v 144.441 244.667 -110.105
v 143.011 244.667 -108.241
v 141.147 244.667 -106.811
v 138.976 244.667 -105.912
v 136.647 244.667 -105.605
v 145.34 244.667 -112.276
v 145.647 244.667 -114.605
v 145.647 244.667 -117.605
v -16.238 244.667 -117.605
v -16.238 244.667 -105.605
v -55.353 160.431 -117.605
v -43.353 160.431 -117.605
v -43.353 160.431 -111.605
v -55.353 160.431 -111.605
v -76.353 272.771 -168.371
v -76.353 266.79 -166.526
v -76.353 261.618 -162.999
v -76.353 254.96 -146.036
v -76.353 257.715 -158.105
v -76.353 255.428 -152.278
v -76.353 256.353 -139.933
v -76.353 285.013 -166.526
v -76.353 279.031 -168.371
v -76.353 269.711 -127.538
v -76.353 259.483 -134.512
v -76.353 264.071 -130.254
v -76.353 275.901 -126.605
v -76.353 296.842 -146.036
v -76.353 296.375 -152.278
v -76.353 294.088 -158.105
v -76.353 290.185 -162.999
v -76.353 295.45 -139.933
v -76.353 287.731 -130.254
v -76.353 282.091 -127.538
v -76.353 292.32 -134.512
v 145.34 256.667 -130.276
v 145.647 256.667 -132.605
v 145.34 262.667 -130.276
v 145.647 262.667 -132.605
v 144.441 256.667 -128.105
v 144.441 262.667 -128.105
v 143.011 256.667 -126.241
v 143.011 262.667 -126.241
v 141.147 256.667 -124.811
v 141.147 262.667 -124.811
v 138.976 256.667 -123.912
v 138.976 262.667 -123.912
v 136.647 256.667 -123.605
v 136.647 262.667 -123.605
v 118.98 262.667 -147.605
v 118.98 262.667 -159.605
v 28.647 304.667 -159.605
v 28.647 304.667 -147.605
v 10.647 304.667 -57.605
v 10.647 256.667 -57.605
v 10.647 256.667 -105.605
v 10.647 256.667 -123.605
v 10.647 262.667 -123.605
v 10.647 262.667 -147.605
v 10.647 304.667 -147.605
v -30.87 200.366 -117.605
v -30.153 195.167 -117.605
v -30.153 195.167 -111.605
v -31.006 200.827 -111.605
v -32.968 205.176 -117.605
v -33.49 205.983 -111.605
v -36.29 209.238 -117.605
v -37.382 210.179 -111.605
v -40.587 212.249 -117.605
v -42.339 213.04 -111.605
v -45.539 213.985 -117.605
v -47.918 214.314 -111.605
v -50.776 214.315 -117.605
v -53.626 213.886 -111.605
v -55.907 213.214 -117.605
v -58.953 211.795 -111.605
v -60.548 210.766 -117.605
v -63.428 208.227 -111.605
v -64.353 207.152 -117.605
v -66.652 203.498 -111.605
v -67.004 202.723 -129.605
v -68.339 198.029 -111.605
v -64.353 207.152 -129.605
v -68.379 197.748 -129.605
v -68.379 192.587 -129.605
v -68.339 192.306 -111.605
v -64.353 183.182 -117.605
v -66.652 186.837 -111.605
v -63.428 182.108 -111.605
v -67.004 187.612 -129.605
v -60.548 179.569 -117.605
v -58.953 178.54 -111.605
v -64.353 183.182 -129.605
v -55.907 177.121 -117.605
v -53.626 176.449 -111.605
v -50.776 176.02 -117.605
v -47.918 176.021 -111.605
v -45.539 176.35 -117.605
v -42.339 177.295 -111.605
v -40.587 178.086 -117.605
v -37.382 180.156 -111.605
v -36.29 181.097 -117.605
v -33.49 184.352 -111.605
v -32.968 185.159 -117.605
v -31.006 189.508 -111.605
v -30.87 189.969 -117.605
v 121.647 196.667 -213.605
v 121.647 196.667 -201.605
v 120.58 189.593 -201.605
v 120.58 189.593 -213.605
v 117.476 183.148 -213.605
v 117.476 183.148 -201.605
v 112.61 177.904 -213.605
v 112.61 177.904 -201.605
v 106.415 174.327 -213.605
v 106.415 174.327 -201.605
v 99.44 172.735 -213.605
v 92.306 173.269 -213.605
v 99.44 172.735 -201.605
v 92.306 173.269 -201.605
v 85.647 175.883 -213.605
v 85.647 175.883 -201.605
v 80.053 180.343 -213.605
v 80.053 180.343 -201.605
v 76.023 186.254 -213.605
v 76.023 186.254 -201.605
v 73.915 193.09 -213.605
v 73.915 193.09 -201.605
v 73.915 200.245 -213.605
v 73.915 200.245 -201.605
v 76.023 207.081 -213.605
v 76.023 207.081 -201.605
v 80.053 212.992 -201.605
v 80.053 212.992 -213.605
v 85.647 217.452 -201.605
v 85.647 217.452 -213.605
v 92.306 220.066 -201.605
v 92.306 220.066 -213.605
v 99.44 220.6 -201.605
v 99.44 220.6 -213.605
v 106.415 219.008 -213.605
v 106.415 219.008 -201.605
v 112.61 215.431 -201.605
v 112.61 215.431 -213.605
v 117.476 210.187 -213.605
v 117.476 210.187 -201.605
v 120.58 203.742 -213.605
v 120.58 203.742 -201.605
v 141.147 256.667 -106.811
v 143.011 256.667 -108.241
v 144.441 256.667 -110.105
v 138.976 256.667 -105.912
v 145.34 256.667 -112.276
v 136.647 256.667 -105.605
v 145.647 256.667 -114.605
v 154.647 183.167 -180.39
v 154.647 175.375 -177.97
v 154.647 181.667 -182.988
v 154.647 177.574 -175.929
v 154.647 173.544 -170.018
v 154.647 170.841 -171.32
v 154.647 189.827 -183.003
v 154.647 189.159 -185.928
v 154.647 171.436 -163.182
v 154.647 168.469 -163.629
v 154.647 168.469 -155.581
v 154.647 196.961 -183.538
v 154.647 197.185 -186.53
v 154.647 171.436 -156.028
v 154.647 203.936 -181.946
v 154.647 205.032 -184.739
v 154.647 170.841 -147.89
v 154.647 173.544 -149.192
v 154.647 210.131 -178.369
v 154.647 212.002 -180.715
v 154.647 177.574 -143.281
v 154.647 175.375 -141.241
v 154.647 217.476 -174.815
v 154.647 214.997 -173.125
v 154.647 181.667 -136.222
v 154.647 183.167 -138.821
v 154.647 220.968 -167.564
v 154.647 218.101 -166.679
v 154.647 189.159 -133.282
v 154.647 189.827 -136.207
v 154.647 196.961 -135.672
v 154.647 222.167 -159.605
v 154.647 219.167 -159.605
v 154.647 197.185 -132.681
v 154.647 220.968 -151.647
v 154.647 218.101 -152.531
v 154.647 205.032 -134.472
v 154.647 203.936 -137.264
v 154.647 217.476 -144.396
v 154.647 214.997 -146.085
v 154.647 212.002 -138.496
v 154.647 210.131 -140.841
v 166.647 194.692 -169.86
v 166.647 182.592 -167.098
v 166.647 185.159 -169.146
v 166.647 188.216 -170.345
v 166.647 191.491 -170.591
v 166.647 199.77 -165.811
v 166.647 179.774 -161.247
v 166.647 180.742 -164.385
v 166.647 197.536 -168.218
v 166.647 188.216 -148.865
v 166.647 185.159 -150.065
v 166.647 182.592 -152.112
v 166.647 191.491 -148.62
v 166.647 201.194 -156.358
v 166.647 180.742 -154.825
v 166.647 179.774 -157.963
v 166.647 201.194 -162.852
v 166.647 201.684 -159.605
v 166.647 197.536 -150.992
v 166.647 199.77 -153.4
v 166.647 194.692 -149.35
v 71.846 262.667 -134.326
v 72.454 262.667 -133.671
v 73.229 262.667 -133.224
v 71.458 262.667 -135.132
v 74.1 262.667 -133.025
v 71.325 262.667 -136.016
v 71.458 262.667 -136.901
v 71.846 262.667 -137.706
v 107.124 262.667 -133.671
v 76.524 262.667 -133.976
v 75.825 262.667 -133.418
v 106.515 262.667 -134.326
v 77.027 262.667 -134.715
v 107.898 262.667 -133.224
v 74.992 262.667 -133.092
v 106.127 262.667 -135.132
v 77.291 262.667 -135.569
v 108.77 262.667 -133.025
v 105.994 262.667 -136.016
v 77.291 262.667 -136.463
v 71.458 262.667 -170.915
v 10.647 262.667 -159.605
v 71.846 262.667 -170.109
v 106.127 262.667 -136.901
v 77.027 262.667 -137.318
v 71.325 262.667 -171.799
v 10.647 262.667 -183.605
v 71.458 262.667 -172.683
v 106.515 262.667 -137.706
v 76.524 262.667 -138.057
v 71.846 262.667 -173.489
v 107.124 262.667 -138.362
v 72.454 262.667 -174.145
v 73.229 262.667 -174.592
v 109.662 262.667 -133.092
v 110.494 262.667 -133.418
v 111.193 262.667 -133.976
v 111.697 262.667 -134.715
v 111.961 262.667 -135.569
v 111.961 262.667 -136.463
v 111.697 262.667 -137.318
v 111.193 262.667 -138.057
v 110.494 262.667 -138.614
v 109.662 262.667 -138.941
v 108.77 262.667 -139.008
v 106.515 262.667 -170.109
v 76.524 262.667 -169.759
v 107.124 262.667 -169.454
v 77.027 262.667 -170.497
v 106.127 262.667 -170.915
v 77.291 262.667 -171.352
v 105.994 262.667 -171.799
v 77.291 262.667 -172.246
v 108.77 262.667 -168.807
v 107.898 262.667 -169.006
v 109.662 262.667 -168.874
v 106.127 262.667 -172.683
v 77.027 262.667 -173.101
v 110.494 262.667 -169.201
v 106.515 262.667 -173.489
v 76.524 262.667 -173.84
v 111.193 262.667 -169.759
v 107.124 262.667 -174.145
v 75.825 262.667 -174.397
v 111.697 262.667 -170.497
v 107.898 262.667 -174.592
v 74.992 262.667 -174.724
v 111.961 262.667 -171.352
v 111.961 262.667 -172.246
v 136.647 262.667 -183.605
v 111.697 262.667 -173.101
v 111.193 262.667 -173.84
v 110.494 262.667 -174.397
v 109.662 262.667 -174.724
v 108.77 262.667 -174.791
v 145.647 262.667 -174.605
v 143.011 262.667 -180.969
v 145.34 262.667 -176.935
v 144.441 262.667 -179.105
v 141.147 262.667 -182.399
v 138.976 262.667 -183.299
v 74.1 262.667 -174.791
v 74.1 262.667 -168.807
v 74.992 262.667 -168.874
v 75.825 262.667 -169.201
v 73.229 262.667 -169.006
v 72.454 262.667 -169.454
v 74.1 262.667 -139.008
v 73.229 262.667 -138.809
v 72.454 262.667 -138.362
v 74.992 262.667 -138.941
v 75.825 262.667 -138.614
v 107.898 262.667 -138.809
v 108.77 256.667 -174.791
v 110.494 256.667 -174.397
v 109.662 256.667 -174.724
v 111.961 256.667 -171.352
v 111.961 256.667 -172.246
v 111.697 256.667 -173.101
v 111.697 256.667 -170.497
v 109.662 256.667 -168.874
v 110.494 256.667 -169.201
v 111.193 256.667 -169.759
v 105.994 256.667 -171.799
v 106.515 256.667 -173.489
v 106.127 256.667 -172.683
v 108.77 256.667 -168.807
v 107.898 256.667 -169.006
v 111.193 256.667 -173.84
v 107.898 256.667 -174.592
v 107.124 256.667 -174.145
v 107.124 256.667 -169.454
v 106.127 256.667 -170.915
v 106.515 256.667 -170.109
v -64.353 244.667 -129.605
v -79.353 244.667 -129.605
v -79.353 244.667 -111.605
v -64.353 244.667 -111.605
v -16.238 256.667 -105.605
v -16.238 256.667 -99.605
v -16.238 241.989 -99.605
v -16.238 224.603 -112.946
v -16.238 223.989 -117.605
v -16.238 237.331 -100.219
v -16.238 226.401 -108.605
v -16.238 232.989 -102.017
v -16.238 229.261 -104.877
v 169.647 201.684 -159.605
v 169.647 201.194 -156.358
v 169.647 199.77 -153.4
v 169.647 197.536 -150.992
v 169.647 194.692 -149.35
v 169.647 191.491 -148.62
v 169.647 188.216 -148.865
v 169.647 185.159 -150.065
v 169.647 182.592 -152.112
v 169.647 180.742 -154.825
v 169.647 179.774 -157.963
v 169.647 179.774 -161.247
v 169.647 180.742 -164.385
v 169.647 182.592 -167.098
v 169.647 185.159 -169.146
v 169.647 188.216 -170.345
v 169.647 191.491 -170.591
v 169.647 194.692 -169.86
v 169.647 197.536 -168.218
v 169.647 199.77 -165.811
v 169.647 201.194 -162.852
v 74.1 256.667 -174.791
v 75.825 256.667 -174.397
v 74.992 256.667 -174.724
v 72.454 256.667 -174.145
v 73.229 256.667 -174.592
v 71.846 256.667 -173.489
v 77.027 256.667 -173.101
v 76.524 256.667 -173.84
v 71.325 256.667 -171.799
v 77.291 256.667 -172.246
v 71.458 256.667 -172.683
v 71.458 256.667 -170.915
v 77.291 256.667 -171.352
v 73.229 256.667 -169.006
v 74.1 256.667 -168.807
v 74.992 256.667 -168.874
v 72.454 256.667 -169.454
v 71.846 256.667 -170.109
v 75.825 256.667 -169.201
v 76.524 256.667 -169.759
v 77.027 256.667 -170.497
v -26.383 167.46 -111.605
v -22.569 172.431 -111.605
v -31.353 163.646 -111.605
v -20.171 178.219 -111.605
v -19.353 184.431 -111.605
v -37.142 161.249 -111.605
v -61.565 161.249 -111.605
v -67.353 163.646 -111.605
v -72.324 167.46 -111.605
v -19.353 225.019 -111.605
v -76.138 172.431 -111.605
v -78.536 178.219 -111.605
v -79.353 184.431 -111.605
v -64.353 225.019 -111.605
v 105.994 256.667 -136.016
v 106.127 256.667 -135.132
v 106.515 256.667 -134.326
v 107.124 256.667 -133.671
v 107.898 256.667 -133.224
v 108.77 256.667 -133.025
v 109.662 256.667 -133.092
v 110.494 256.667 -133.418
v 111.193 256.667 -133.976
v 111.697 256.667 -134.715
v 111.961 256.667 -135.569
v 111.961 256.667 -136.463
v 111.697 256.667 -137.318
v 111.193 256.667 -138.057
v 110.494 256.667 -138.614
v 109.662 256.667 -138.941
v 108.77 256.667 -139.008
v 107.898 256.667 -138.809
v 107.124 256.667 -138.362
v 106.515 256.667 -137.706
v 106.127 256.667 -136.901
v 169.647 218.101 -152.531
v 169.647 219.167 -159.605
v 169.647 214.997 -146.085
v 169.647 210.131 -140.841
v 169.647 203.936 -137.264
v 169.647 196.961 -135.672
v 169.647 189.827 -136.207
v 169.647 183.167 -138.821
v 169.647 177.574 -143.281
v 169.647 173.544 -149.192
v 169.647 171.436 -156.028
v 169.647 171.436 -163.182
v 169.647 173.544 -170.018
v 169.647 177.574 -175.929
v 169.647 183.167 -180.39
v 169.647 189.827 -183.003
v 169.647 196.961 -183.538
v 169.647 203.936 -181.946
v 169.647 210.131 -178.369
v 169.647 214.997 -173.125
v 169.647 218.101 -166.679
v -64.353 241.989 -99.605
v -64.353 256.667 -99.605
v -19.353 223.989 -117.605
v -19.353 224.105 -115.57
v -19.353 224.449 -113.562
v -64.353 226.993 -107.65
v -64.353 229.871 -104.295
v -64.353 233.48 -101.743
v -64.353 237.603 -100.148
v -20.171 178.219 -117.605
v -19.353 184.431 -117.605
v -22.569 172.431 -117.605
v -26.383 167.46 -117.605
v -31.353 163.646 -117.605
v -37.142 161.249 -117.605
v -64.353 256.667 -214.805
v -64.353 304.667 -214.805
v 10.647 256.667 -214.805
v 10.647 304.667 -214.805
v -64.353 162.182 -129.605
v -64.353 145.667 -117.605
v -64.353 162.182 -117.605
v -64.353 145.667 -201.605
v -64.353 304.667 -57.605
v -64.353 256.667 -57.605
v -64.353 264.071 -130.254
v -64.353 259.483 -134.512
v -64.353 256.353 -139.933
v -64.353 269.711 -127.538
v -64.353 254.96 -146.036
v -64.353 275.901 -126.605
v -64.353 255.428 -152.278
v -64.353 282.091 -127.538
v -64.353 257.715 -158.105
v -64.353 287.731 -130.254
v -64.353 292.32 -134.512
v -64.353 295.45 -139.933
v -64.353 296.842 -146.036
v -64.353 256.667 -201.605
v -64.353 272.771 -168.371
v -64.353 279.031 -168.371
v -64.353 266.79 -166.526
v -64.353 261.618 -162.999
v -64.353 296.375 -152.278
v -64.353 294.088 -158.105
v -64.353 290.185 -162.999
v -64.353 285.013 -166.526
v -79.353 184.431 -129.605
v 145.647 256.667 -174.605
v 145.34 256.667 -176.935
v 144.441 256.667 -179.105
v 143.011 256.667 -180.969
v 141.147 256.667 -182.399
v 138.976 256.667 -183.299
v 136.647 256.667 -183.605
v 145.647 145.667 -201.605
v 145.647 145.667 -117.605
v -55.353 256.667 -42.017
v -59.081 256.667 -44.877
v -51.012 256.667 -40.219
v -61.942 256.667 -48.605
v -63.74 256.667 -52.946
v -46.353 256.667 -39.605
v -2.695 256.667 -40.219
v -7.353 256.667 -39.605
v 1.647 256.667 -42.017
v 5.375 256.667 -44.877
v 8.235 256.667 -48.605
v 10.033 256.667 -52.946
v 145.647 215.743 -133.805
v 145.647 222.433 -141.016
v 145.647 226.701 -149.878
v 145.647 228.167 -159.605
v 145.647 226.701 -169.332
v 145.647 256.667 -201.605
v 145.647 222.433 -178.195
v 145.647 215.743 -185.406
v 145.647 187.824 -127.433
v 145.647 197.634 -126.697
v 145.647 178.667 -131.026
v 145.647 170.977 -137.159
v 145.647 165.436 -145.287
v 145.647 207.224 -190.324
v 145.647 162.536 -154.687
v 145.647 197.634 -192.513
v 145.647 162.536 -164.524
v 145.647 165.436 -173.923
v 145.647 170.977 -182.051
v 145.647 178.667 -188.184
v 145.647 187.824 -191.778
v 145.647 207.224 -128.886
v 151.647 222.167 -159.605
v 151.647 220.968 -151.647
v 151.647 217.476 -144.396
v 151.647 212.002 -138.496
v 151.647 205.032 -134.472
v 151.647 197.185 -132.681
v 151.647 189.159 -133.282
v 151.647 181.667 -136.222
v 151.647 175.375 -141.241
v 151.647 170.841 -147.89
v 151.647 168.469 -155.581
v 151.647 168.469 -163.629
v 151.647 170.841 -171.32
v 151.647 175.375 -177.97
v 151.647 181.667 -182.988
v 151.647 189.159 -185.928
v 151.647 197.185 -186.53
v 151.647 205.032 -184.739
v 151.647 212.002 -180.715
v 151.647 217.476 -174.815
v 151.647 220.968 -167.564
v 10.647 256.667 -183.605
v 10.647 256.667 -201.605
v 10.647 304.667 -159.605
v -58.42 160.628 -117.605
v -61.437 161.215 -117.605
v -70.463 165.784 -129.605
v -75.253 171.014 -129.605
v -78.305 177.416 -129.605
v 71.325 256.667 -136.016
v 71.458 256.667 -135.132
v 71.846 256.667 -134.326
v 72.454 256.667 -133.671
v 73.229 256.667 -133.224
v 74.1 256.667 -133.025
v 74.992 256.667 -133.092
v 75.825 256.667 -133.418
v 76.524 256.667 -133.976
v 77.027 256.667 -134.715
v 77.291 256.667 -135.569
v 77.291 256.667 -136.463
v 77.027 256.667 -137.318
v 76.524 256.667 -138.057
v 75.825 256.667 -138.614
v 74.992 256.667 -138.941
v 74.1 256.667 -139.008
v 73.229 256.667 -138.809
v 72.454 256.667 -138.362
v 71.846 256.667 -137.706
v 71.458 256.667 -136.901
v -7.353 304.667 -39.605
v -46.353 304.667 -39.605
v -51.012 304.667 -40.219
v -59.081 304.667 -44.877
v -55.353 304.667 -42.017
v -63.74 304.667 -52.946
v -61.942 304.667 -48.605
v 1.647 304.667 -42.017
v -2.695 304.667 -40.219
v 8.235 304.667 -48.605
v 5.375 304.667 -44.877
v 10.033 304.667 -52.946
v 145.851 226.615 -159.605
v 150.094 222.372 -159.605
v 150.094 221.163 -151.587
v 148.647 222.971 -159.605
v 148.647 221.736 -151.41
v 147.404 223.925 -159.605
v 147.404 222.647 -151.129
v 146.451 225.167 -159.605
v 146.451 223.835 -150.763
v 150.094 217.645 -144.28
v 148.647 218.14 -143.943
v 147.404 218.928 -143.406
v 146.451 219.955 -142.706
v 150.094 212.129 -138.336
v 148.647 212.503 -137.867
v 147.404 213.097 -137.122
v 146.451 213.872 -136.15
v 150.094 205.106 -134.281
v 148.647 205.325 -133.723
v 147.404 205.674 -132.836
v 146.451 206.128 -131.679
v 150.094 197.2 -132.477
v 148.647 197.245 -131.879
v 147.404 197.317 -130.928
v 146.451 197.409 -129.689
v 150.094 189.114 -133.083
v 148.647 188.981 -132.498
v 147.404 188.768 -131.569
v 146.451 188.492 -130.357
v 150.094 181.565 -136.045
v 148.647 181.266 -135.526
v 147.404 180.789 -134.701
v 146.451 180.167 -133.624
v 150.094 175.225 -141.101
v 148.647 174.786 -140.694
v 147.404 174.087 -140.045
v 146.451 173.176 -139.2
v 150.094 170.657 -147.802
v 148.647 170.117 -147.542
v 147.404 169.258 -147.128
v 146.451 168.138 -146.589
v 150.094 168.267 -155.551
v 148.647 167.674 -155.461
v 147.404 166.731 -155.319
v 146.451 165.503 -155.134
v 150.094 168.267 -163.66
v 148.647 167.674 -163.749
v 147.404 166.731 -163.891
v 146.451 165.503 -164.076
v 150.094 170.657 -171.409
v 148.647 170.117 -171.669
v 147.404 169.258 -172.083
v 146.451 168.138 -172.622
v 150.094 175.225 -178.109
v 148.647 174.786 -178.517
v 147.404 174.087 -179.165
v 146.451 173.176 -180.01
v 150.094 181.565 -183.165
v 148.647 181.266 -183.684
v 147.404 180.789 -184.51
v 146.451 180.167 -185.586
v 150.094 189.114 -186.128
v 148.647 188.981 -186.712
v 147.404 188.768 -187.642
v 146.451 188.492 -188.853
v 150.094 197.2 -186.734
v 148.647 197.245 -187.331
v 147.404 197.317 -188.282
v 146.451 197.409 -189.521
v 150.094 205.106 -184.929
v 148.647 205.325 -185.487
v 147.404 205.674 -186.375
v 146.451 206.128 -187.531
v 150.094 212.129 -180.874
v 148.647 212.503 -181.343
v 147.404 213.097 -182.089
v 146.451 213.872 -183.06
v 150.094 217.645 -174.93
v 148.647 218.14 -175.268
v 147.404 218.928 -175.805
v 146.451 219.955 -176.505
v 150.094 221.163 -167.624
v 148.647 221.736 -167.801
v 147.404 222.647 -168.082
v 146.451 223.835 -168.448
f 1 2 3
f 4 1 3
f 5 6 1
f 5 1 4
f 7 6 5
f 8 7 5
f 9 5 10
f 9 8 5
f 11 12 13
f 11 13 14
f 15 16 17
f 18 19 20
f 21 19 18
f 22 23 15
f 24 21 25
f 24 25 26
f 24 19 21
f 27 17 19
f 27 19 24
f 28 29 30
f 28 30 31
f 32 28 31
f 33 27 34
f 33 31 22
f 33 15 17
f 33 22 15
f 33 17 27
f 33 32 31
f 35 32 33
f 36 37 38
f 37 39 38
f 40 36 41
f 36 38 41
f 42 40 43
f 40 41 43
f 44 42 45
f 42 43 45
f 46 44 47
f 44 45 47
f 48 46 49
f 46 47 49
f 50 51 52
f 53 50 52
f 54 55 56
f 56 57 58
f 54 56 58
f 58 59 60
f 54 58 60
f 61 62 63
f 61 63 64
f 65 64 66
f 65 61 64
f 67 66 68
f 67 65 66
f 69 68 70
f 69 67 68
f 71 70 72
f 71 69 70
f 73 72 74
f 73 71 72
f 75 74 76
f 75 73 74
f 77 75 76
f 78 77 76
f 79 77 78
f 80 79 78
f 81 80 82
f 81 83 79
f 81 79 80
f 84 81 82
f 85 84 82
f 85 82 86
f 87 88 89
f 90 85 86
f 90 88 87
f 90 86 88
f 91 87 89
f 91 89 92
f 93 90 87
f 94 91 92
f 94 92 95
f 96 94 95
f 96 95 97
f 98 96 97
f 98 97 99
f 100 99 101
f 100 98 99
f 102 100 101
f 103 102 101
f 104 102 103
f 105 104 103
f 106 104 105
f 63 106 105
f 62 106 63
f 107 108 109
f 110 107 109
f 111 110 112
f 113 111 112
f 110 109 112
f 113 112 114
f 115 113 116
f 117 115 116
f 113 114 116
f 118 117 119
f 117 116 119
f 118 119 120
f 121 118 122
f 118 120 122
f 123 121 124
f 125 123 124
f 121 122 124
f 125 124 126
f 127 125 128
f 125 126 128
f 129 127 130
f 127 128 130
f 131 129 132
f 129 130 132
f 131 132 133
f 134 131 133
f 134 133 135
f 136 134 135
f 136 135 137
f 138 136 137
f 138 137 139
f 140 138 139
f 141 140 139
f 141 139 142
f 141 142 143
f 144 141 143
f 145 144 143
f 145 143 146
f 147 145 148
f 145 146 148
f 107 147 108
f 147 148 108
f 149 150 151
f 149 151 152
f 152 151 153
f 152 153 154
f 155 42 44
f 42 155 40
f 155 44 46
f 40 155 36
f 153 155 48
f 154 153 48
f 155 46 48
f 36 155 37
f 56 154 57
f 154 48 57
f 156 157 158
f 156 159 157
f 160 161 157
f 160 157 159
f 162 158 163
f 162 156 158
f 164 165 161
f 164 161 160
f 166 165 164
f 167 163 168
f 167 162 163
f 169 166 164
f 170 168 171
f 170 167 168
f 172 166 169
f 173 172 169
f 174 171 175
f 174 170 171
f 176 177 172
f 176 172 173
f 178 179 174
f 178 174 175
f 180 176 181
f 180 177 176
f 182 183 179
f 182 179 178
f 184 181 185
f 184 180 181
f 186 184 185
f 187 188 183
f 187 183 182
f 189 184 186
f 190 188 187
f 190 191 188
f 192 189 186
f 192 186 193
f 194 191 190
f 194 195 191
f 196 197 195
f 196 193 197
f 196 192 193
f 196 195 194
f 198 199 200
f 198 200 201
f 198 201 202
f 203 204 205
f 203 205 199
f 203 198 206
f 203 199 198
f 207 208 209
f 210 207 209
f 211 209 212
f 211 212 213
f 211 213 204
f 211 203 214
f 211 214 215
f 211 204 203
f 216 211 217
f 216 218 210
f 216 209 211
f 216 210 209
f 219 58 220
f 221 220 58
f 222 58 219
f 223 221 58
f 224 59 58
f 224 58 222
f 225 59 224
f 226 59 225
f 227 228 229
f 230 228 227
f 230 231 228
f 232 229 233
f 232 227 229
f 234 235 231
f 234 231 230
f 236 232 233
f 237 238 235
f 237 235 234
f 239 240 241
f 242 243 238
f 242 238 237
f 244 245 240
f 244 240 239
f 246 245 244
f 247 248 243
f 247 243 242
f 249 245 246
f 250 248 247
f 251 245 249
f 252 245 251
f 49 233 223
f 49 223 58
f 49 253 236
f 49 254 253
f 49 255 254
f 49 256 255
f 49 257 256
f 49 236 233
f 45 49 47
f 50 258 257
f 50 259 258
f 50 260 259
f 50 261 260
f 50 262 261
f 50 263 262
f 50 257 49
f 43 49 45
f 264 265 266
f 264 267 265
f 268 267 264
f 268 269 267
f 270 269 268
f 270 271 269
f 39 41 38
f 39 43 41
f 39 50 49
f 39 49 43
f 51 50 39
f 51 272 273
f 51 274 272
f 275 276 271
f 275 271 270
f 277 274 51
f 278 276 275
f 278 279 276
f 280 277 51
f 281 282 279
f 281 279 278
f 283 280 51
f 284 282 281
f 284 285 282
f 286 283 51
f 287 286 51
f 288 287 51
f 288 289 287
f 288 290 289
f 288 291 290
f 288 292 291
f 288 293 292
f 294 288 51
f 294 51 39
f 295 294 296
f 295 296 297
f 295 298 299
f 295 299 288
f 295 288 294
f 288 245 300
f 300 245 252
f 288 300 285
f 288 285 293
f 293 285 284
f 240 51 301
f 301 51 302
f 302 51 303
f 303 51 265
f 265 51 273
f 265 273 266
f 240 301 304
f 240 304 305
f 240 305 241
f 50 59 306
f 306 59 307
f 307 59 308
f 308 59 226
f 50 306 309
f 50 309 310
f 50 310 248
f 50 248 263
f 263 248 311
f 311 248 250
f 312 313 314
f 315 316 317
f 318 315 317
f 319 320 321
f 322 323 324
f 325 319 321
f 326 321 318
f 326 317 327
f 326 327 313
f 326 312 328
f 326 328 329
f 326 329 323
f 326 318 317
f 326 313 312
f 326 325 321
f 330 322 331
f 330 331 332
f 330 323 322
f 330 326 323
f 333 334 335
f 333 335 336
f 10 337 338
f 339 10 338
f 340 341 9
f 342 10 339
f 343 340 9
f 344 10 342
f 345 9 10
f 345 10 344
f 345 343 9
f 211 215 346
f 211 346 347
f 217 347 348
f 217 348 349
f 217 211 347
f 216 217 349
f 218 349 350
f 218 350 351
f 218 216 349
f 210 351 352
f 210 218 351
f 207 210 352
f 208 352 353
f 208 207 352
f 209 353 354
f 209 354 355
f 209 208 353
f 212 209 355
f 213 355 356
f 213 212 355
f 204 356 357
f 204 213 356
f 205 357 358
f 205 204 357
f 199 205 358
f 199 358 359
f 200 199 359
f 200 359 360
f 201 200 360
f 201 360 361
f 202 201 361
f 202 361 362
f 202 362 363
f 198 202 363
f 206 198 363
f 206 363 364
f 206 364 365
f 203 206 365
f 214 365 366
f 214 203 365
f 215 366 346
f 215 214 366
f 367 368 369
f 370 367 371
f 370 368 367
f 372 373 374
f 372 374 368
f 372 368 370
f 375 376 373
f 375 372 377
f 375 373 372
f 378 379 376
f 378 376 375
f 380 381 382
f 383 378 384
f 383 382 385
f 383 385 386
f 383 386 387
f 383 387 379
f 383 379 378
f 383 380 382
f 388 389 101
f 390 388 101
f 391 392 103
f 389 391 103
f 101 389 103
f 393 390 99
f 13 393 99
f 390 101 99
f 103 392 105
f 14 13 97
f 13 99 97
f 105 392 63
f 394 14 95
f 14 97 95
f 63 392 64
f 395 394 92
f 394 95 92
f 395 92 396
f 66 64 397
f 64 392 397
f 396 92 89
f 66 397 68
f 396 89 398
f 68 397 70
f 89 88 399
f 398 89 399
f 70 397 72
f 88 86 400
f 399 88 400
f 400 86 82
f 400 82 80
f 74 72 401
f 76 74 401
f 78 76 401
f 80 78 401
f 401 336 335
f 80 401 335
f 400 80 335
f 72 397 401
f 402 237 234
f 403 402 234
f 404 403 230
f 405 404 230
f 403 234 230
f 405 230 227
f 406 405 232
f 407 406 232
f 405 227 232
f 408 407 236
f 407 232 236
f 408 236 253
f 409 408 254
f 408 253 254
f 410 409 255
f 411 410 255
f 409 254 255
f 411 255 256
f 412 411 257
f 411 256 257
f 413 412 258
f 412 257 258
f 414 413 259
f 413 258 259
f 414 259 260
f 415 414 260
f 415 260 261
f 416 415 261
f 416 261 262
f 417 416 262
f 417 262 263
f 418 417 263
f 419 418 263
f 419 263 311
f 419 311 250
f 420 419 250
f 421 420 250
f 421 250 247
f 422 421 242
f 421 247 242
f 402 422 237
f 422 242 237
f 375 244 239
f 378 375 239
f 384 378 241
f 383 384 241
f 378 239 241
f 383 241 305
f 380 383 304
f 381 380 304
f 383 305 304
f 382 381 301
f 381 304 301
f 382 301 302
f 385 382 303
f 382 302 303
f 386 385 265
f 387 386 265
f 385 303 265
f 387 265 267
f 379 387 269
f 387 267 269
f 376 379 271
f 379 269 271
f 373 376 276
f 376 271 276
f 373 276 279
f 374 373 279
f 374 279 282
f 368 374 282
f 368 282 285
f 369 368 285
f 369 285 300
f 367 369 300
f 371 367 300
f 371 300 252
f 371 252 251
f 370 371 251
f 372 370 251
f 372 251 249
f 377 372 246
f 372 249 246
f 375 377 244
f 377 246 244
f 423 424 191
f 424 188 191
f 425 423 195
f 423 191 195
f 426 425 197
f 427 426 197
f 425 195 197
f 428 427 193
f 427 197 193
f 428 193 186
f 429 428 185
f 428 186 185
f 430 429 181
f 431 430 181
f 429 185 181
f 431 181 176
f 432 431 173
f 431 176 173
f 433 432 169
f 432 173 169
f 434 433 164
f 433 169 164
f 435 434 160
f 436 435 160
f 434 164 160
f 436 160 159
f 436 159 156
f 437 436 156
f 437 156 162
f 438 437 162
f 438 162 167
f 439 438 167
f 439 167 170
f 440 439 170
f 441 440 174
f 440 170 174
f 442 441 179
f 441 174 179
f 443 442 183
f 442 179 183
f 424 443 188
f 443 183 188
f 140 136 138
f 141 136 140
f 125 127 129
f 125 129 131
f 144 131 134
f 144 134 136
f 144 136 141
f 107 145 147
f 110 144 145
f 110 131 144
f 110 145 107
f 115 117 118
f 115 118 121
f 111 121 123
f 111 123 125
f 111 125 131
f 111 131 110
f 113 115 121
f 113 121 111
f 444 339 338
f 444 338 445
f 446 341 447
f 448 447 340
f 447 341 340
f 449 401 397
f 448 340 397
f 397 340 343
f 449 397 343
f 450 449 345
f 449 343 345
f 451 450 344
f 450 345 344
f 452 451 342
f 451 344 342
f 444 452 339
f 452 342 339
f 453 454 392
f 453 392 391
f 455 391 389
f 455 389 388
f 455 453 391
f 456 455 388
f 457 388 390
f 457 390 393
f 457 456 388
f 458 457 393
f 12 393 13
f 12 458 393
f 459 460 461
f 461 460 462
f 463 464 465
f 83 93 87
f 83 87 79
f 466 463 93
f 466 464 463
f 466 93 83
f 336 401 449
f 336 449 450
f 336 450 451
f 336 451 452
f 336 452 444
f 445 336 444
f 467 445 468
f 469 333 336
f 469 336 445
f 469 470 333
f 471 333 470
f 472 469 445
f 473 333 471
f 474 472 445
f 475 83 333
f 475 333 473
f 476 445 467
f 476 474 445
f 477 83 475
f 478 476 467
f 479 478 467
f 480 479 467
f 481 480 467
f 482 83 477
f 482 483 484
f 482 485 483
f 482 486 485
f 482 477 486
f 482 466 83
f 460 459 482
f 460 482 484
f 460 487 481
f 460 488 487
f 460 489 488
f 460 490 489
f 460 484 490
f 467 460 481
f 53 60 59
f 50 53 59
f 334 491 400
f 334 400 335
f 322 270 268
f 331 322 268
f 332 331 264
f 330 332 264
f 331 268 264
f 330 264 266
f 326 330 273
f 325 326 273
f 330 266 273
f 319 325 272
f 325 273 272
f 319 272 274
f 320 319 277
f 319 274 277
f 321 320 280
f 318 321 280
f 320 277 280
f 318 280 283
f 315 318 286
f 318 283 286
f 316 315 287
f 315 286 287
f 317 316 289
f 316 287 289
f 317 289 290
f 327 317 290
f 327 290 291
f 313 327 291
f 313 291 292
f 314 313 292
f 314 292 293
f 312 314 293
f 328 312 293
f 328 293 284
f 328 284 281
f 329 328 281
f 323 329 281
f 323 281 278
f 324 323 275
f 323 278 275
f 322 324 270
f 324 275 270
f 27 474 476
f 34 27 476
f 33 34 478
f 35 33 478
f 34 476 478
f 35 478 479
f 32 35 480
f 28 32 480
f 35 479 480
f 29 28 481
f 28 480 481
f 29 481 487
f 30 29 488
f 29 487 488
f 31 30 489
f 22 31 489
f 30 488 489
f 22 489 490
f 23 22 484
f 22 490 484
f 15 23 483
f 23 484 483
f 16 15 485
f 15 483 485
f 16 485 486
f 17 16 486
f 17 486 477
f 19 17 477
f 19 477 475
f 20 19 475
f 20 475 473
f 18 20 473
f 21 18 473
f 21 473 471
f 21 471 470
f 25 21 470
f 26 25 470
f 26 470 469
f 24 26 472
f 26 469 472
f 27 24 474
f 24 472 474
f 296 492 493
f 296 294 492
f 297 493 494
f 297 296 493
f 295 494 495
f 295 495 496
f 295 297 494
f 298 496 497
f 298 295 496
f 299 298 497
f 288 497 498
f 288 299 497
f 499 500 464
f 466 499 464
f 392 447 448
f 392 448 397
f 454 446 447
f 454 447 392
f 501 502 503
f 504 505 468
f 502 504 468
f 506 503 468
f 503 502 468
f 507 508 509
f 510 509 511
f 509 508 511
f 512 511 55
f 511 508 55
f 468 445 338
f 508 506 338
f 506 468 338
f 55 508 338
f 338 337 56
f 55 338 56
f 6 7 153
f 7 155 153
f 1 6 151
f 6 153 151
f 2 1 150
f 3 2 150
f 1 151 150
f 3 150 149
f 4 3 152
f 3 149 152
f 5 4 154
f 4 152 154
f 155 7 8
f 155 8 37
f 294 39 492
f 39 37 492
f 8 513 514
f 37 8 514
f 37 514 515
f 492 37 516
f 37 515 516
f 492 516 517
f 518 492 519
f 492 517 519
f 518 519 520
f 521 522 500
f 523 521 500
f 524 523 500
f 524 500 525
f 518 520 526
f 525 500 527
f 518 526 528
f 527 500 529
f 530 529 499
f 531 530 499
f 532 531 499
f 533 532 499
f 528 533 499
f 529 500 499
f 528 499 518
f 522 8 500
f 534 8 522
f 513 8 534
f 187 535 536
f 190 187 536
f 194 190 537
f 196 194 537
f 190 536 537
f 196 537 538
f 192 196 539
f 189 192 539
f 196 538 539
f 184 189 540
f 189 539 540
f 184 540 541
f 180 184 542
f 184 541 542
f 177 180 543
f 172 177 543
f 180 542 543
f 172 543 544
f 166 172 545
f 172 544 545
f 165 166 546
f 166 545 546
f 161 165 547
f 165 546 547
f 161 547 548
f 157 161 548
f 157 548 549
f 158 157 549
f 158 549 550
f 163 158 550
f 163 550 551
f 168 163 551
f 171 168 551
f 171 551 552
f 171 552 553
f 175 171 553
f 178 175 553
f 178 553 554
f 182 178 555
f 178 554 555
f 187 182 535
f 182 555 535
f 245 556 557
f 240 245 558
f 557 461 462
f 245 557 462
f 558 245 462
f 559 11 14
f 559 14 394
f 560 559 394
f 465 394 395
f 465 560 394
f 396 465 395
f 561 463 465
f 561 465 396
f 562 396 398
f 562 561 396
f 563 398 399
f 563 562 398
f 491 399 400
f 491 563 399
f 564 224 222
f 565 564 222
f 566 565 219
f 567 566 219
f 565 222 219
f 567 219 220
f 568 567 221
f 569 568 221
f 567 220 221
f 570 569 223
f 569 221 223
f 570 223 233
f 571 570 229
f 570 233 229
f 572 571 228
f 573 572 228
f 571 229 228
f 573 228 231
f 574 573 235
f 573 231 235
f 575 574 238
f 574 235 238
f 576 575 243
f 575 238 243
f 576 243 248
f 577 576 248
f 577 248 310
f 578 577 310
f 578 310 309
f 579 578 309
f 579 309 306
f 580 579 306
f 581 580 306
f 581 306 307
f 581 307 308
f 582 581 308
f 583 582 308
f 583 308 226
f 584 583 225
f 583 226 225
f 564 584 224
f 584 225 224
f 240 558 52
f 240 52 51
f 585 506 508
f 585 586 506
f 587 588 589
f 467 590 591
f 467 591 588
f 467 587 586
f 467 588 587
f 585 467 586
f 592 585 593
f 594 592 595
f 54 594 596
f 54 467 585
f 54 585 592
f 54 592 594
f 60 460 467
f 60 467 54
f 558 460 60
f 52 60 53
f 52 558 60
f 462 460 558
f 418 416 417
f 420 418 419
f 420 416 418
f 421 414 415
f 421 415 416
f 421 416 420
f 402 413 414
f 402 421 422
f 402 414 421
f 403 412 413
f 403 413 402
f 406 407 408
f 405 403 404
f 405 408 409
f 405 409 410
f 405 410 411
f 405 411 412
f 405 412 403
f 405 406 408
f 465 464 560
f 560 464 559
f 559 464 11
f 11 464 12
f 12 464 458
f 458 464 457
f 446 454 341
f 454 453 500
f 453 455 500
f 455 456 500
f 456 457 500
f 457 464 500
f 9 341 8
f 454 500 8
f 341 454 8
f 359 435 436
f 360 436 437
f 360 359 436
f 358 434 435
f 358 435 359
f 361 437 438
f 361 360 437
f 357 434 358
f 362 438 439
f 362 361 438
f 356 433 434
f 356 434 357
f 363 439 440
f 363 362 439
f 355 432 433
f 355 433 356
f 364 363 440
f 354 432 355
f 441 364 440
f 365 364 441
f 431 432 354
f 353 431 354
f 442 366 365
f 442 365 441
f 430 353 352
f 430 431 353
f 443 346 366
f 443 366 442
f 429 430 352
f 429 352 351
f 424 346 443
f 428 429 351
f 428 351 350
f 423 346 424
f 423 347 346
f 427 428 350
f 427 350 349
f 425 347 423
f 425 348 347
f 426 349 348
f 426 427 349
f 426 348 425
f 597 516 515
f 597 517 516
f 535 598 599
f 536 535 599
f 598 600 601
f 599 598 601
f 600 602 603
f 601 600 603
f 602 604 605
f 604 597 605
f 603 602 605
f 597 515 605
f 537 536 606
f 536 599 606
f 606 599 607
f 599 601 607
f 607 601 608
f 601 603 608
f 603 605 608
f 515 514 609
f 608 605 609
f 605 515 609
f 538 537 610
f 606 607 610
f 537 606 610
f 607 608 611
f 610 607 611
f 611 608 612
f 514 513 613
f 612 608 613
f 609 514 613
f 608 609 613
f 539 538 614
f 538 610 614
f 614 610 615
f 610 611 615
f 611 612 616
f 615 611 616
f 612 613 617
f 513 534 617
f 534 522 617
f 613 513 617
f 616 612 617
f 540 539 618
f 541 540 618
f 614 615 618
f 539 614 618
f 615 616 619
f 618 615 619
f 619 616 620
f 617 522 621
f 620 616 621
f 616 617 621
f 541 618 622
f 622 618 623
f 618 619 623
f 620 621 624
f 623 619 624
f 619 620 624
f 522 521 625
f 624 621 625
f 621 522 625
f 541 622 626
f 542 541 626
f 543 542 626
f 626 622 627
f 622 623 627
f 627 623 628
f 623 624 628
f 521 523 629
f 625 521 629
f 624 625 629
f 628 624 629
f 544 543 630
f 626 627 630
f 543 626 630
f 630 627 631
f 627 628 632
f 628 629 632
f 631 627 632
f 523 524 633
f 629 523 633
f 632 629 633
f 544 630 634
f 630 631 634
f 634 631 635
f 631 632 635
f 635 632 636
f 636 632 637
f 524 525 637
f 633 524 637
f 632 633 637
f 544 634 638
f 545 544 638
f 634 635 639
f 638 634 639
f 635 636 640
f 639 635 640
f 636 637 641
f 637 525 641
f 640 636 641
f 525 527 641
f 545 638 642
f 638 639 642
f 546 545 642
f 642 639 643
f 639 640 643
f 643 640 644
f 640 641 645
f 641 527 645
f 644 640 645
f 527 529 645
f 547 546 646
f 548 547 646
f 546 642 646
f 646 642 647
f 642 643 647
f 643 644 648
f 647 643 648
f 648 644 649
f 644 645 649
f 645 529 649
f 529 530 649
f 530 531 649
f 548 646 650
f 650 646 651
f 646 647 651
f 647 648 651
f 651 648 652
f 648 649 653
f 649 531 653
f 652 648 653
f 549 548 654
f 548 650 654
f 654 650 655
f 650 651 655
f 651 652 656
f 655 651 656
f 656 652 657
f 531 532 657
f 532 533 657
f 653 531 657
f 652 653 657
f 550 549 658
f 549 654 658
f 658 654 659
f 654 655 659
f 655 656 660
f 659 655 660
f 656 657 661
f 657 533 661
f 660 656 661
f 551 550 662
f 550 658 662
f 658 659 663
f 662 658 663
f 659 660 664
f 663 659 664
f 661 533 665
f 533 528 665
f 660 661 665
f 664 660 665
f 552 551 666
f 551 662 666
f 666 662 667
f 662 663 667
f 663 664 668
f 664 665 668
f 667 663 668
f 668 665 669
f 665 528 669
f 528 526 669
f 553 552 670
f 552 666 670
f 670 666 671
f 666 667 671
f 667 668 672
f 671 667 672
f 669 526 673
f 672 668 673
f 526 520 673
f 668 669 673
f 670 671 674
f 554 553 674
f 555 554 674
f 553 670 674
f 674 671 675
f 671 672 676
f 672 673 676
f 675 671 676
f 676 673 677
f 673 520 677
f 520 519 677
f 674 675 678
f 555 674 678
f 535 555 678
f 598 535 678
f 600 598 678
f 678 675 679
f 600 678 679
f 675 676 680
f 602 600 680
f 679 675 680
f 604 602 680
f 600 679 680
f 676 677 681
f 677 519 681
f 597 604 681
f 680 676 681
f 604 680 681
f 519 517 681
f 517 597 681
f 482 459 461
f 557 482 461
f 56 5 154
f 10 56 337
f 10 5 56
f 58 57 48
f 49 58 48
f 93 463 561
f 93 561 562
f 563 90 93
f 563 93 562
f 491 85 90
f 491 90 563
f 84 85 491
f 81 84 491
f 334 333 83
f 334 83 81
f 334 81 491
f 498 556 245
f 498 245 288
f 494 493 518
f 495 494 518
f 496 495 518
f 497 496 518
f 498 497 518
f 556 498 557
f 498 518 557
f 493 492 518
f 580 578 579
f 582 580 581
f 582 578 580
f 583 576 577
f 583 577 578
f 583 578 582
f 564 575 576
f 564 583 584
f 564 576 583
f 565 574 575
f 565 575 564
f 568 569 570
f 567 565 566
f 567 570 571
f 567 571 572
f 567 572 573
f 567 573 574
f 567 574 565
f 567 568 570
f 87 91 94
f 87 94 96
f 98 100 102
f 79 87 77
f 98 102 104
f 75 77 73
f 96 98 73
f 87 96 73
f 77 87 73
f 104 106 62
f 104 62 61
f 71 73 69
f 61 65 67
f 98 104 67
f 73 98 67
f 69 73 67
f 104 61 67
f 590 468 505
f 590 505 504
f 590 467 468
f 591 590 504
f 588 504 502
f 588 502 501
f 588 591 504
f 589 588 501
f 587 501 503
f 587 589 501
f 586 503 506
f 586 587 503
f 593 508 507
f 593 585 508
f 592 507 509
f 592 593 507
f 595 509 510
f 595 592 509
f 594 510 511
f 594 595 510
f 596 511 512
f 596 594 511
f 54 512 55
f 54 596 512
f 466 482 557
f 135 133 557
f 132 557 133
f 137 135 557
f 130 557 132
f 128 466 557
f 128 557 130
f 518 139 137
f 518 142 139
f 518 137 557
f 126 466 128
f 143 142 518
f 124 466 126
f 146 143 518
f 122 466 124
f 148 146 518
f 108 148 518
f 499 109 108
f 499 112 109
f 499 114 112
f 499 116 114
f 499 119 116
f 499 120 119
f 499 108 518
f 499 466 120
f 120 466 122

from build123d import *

# Parameters (mm, degrees)
BOSS_EXTRUDE1_DEPTH       = 150
BOSS_EXTRUDE1_DEPTH_BACK  = 100
SKETCH1_W                 = 250
SKETCH1_H                 = 230
SKETCH2_W                 = 200
SKETCH2_H                 = 30
BOSS_EXTRUDE2_DEPTH       = 150
BOSS_EXTRUDE3_DEPTH       = 120
BOSS_EXTRUDE3_DEPTH_BACK  = 20
SKETCH4_W                 = 350
SKETCH4_H                 = 165
RIB1_REACH                = 447.477
SKETCH5_WALL_W            = 1072.6047598
SKETCH5_WALL_H            = 250
SKETCH6_R                 = 45
BOSS_EXTRUDE4_DEPTH       = 15
SKETCH7_R                 = 40
BOSS_EXTRUDE5_DEPTH       = 20
SKETCH8_W                 = 100
SKETCH8_H                 = 100
SKETCH10_W                = 20
SKETCH10_H                = 100
BOSS_EXTRUDE6_DEPTH       = 150
RIB2_REACH                = 449.985
SKETCH12_WALL_W           = 999.204922194
SKETCH12_WALL_H           = 20
SKETCH13_R                = 32
CUT_EXTRUDE1_DEPTH        = 10
FILLET1_R                 = 50
FILLET2_R                 = 30
FILLET3_R                 = 15
FILLET4_R                 = 15
SKETCH14_R                = 40
SKETCH14_R_2              = 18.360426304
BOSS_EXTRUDE7_DEPTH       = 5
FILLET6_R                 = 10
SKETCH15_W                = 250
SKETCH15_H                = 230
SKETCH15_W_2              = 170
SKETCH15_H_2              = 165.671954638
CUT_EXTRUDE2_DEPTH        = 40
SKETCH16_R                = 50
SKETCH16_R_2              = 30
BOSS_EXTRUDE8_DEPTH       = 30
SKETCH16_2_R              = 30
BOSS_EXTRUDE9_DEPTH       = 50
SKETCH17_W                = 787.442297404
SKETCH17_H                = 468.570764298
CUT_EXTRUDE3_DEPTH        = 459.262102583
SKETCH18_W                = 754.820557273
SKETCH18_H                = 297.051261894
CUT_EXTRUDE4_DEPTH        = 391.736484091
BOSS_EXTRUDE10_DEPTH      = 30
BOSS_EXTRUDE11_DEPTH      = 20
BOSS_EXTRUDE12_DEPTH      = 100
BOSS_EXTRUDE12_DEPTH_BACK = 192
SKETCH23_W                = 125
SKETCH23_H                = 80
SKETCH26_W                = 38.43559463
SKETCH26_H                = 130.536564267
CUT_EXTRUDE8_DEPTH        = 196
SKETCH27_W                = 225
SKETCH27_H                = 100
BOSS_EXTRUDE14_DEPTH      = 10
BOSS_EXTRUDE15_DEPTH      = 10
BOSS_EXTRUDE15_DEPTH_BACK = 10
SKETCH29_R                = 35
BOSS_EXTRUDE16_DEPTH      = 20
FILLET7_R                 = 15
FILLET9_R                 = 15
SKETCH33_R                = 40
BOSS_EXTRUDE17_DEPTH      = 20
SKETCH31_R                = 5
CUT_EXTRUDE10_DEPTH       = 10
BOSS_EXTRUDE18_DEPTH      = 10
BOSS_EXTRUDE18_DEPTH_BACK = 20
SKETCH20_R                = 32
FILLET10_R                = 30
SCALE1_SCALE              = 0.6


with BuildPart() as part:
    # Sketch1 → Boss-Extrude1 (new, two sides: drawn at the far end of the back side and taken through both)
    with BuildSketch(Plane(origin=(0, 0, 0), x_dir=(1, 0, 0), z_dir=(0, 1, 0)).offset(-BOSS_EXTRUDE1_DEPTH_BACK)):
        Rectangle(SKETCH1_W, SKETCH1_H)
    extrude(amount=BOSS_EXTRUDE1_DEPTH + BOSS_EXTRUDE1_DEPTH_BACK)

    # Sketch2 → Boss-Extrude2 (add)
    with BuildSketch(Plane(origin=(125, 0, 0), x_dir=(0, 0, -1), z_dir=(1, 0, 0))):
        with Locations((0, -15)):
            Rectangle(SKETCH2_W, SKETCH2_H)
    extrude(amount=BOSS_EXTRUDE2_DEPTH)

    # Sketch4 → Boss-Extrude3 (add, two sides: drawn at the far end of the back side and taken through both)
    with BuildSketch(Plane(origin=(0, 0, -115), x_dir=(-1, 0, 0), z_dir=(0, 0, -1)).offset(-BOSS_EXTRUDE3_DEPTH_BACK)):
        with Locations((-50, 177.5)):
            Rectangle(SKETCH4_W, SKETCH4_H)
    extrude(amount=BOSS_EXTRUDE3_DEPTH + BOSS_EXTRUDE3_DEPTH_BACK)

    # Sketch5 wall → Rib1 (add, up to next)
    with BuildSketch(Plane(origin=(0, 205, -23.982044646), x_dir=(0, 0.612300963241, -0.790624772199), z_dir=(0, 0.790624772199, 0.612300963241)), mode=Mode.PRIVATE) as rib1_sk1:
        Rectangle(SKETCH5_WALL_W, SKETCH5_WALL_H)
    rib1_tool1 = extrude(rib1_sk1.sketch, amount=-RIB1_REACH, mode=Mode.PRIVATE) - part.part
    add(rib1_tool1.solids().sort_by_distance((0, 205, -23.982044646))[0])

    # Sketch6 → Boss-Extrude4 (add)
    with BuildSketch(Plane(origin=(225, 0, 0), x_dir=(0, 0, -1), z_dir=(1, 0, 0))):
        with Locations(Location((165, 177.5, 0), (0, 0, 90))):
            Circle(SKETCH6_R)
    extrude(amount=BOSS_EXTRUDE4_DEPTH)

    # Sketch7 → Boss-Extrude5 (add)
    with BuildSketch(Plane(origin=(240, 0, 0), x_dir=(0, 0, -1), z_dir=(1, 0, 0))):
        with Locations(Location((165, 177.5, 0), (0, 0, 90))):
            Circle(SKETCH7_R)
    extrude(amount=BOSS_EXTRUDE5_DEPTH)

    # Sweep1: sweep along a path in Sketch9
    with BuildLine(Plane(origin=(0, 0, 0), x_dir=(0, 0, -1), z_dir=(1, 0, 0))) as sweep1_path:
        ThreePointArc((23.982044646, 205), (3.428361586, 247.544867247), (-5.288861265, 293.983317287))
    # Sketch8 → Sweep1 (sweep)
    with BuildSketch(Plane(origin=(0, 116.533228497, 90.24939588), x_dir=(1, 0, 0), z_dir=(0, 0.7906247721978943, 0.6123009632419566))):
        with Locations((0, 144.482496049)):
            Rectangle(SKETCH8_W, SKETCH8_H)
    sweep(path=sweep1_path.line)

    # Sketch10 → Boss-Extrude6 (add)
    with BuildSketch(Plane(origin=(125, 0, 0), x_dir=(0, 0, -1), z_dir=(1, 0, 0))):
        with Locations((85, 164.273096985)):
            Rectangle(SKETCH10_W, SKETCH10_H)
    extrude(amount=BOSS_EXTRUDE6_DEPTH)

    # Sketch12 wall → Rib2 (add, up to next)
    with BuildSketch(Plane(origin=(160.792179202, 164.273096985, -35.792179202), x_dir=(0.707106781187, 0, -0.707106781187), z_dir=(0.707106781187, 0, 0.707106781187)), mode=Mode.PRIVATE) as rib2_sk1:
        Rectangle(SKETCH12_WALL_W, SKETCH12_WALL_H)
    rib2_tool1 = extrude(rib2_sk1.sketch, amount=-RIB2_REACH, mode=Mode.PRIVATE) - part.part
    add(rib2_tool1.solids().sort_by_distance((160.792179202, 164.273096985, -35.792179202))[0])

    # Sketch13 → Cut-Extrude1 (cut)
    with BuildSketch(Plane.XZ.offset(30)):
        with Locations(Location((218.869669038, 0, 0), (0, 0, 270))):
            Circle(SKETCH13_R)
    extrude(amount=-CUT_EXTRUDE1_DEPTH, mode=Mode.SUBTRACT)

    # Fillet1
    fillet1_edges = [part.edges().sort_by_distance(p)[0] for p in [
        (275, -15, 100),
        (275, -15, -100),
    ]]
    fillet(fillet1_edges, radius=FILLET1_R)

    # Fillet2
    fillet2_edges = [part.edges().sort_by_distance(p)[0] for p in [
        (125, 95, -105),
    ]]
    fillet(fillet2_edges, radius=FILLET2_R)

    # Fillet3
    fillet3_edges = [part.edges().sort_by_distance(p)[0] for p in [
        (125, 214.273096985, -85),
        (125, 114.273096985, -85),
    ]]
    fillet(fillet3_edges, radius=FILLET3_R)

    # Fillet4
    fillet4_edges = [part.edges().sort_by_distance(p)[0] for p in [
        (50, 205, -23.982044646),
        (0, 235.615048162, -63.513283256),
        (-50, 205, -23.982044646),
        (0, 174.384951838, 15.549193964),
    ]]
    fillet(fillet4_edges, radius=FILLET4_R)

    # Sketch14 → Boss-Extrude7 (add)
    with BuildSketch(Plane(origin=(260, 0, 0), x_dir=(0, 0, -1), z_dir=(1, 0, 0))):
        with Locations(Location((165, 177.5, 0), (0, 0, 90))):
            Circle(SKETCH14_R)
        with Locations(Location((165, 170, 0), (0, 0, 90))):
            Circle(SKETCH14_R_2, mode=Mode.SUBTRACT)
    extrude(amount=BOSS_EXTRUDE7_DEPTH)

    # Fillet6
    fillet6_edges = [part.edges().sort_by_distance(p)[0] for p in [
        (225, 132.5, -165),
    ]]
    fillet(fillet6_edges, radius=FILLET6_R)

    # Sketch15 → Cut-Extrude2 (cut)
    with BuildSketch(Plane.XZ.offset(100)):
        Rectangle(SKETCH15_W, SKETCH15_H)
        Rectangle(SKETCH15_W_2, SKETCH15_H_2, mode=Mode.SUBTRACT)
    extrude(amount=-CUT_EXTRUDE2_DEPTH, mode=Mode.SUBTRACT)

    # Sketch16 → Boss-Extrude8 (add)
    with BuildSketch(Plane.ZY.offset(125)):
        with Locations((0, 30)):
            Circle(SKETCH16_R)
        with Locations((0, 30)):
            Circle(SKETCH16_R_2, mode=Mode.SUBTRACT)
    extrude(amount=BOSS_EXTRUDE8_DEPTH)

    # Sketch16<2> → Boss-Extrude9 (add)
    with BuildSketch(Plane.ZY.offset(125)):
        with Locations((0, 30)):
            Circle(SKETCH16_2_R)
    extrude(amount=BOSS_EXTRUDE9_DEPTH)

    # Sketch17 → Cut-Extrude3 (cut, through all)
    with BuildSketch(Plane.XY.offset(-95)):
        with Locations((43.842387257, 99.928182048)):
            Rectangle(SKETCH17_W, SKETCH17_H)
    extrude(amount=CUT_EXTRUDE3_DEPTH, mode=Mode.SUBTRACT)

    # Sketch18 → Cut-Extrude4 (cut, through all)
    with BuildSketch(Plane.XZ.offset(-95)):
        with Locations((103.1212944, -159.735098903)):
            Rectangle(SKETCH18_W, SKETCH18_H)
    extrude(amount=CUT_EXTRUDE4_DEPTH, mode=Mode.SUBTRACT)

    # Sketch19 → Boss-Extrude10 (add)
    with BuildSketch(Plane(origin=(0, 0, -95), x_dir=(-1, 0, 0), z_dir=(0, 0, -1))):
        Polygon((125, 260), (44.807978096, 260), (44.807978096, 161.220017504), (100, 95), (125, 177.5), align=None)
    extrude(amount=-BOSS_EXTRUDE10_DEPTH)

    # Sketch22 → Boss-Extrude11 (add)
    with BuildSketch(Plane(origin=(0, 260, 0), x_dir=(1, 0, 0), z_dir=(0, 1, 0))):
        Polygon((225, 95), (225, 75), (-44.807978096, 75), (-44.807978096, 65), (-125, 65), (-125, 235), (225, 235), align=None)
    extrude(amount=BOSS_EXTRUDE11_DEPTH)

    # Sketch23 → Boss-Extrude12 (add, two sides: drawn at the far end of the back side and taken through both)
    with BuildSketch(Plane.XY.offset(-65).offset(-BOSS_EXTRUDE12_DEPTH_BACK)):
        with Locations((-62.5, 320)):
            Rectangle(SKETCH23_W, SKETCH23_H)
    extrude(amount=BOSS_EXTRUDE12_DEPTH + BOSS_EXTRUDE12_DEPTH_BACK)

    # Sketch26 → Cut-Extrude8 (cut)
    with BuildSketch(Plane(origin=(-44.807978096, 0, 0), x_dir=(0, 0, -1), z_dir=(1, 0, 0))):
        with Locations((75.782202685, 160.268282134)):
            Rectangle(SKETCH26_W, SKETCH26_H)
    extrude(amount=-CUT_EXTRUDE8_DEPTH, mode=Mode.SUBTRACT)

    # Sketch27 → Boss-Extrude14 (add)
    with BuildSketch(Plane(origin=(0, 280, 0), x_dir=(1, 0, 0), z_dir=(0, 1, 0))):
        with Locations((112.5, 155)):
            Rectangle(SKETCH27_W, SKETCH27_H)
    extrude(amount=BOSS_EXTRUDE14_DEPTH)

    # Sketch28 → Boss-Extrude15 (add, two sides: drawn at the far end of the back side and taken through both)
    with BuildSketch(Plane.XY.offset(-155).offset(-BOSS_EXTRUDE15_DEPTH_BACK)):
        Polygon((0, 360), (0, 290), (180.556109721, 290), (30, 360), align=None)
    extrude(amount=BOSS_EXTRUDE15_DEPTH + BOSS_EXTRUDE15_DEPTH_BACK)

    # Sketch29 → Boss-Extrude16 (add)
    with BuildSketch(Plane.ZY.offset(125)):
        with Locations((-145, 312.056134744)):
            Circle(SKETCH29_R)
    extrude(amount=BOSS_EXTRUDE16_DEPTH)

    # Fillet7
    fillet7_edges = [part.edges().sort_by_distance(p)[0] for p in [
        (225, 270, -75),
    ]]
    fillet(fillet7_edges, radius=FILLET7_R)

    # Fillet9
    fillet9_edges = [part.edges().sort_by_distance(p)[0] for p in [
        (225, 285, -205),
        (225, 285, -105),
    ]]
    fillet(fillet9_edges, radius=FILLET9_R)

    # Sketch33 → Boss-Extrude17 (add)
    with BuildSketch(Plane(origin=(0, 0, -235), x_dir=(-1, 0, 0), z_dir=(0, 0, -1))):
        with Locations(Location((-145, 180, 0), (0, 0, 180))):
            Circle(SKETCH33_R)
    extrude(amount=BOSS_EXTRUDE17_DEPTH)

    # Sketch31 → Cut-Extrude10 (cut)
    with BuildSketch(Plane(origin=(0, 290, 0), x_dir=(1, 0, 0), z_dir=(0, 1, 0))):
        with Locations(Location((106.129760479, 125.68527506, 0), (0, 0, 180))):
            Circle(SKETCH31_R)
        with Locations(Location((163.912196034, 125.68527506, 0), (0, 0, 180))):
            Circle(SKETCH31_R)
        with Locations((230.176456992, 125.68527506)):
            Circle(SKETCH31_R)
        with Locations(Location((163.912196034, 185.323109922, 0), (0, 0, 180))):
            Circle(SKETCH31_R)
        with Locations(Location((106.129760479, 185.323109922, 0), (0, 0, 180))):
            Circle(SKETCH31_R)
        with Locations((230.176456992, 185.323109922)):
            Circle(SKETCH31_R)
    extrude(amount=-CUT_EXTRUDE10_DEPTH, mode=Mode.SUBTRACT)

    # Sketch20 → Boss-Extrude18 (add, two sides: drawn at the far end of the back side and taken through both)
    with BuildSketch(Plane.XY.offset(-95).offset(-BOSS_EXTRUDE18_DEPTH_BACK)):
        with BuildLine():
            Line((-50, 260), (-50, 159.605646018))
            ThreePointArc((-50, 159.605646018), (-61.715728753, 131.321374771), (-90, 119.605646018))
            Line((-90, 119.605646018), (-110, 119.605646018))
            ThreePointArc((-110, 119.605646018), (-138.284271247, 131.321374771), (-150, 159.605646018))
            Line((-150, 159.605646018), (-150, 260))
            Line((-150, 260), (-50, 260))
        make_face()
        with Locations((-100, 177.5)):
            Circle(SKETCH20_R, mode=Mode.SUBTRACT)
    extrude(amount=BOSS_EXTRUDE18_DEPTH + BOSS_EXTRUDE18_DEPTH_BACK)

    # Fillet10
    fillet10_edges = [part.edges().sort_by_distance(p)[0] for p in [
        (-84.903989048, 225.536564267, -65),
        (-125, 320, 35),
        (0, 320, 35),
    ]]
    fillet(fillet10_edges, radius=FILLET10_R - 0.0001)  # a hair under: the kernel refuses the full size


with BuildPart() as part_1:
    # Scale1: scaled about (26.616775413, 221.668719116, -151.512951555)
    add(part.part.scale(SCALE1_SCALE).moved(Location((10.646710165, 88.667487646, -60.605180622))))


solid = part_1.part
